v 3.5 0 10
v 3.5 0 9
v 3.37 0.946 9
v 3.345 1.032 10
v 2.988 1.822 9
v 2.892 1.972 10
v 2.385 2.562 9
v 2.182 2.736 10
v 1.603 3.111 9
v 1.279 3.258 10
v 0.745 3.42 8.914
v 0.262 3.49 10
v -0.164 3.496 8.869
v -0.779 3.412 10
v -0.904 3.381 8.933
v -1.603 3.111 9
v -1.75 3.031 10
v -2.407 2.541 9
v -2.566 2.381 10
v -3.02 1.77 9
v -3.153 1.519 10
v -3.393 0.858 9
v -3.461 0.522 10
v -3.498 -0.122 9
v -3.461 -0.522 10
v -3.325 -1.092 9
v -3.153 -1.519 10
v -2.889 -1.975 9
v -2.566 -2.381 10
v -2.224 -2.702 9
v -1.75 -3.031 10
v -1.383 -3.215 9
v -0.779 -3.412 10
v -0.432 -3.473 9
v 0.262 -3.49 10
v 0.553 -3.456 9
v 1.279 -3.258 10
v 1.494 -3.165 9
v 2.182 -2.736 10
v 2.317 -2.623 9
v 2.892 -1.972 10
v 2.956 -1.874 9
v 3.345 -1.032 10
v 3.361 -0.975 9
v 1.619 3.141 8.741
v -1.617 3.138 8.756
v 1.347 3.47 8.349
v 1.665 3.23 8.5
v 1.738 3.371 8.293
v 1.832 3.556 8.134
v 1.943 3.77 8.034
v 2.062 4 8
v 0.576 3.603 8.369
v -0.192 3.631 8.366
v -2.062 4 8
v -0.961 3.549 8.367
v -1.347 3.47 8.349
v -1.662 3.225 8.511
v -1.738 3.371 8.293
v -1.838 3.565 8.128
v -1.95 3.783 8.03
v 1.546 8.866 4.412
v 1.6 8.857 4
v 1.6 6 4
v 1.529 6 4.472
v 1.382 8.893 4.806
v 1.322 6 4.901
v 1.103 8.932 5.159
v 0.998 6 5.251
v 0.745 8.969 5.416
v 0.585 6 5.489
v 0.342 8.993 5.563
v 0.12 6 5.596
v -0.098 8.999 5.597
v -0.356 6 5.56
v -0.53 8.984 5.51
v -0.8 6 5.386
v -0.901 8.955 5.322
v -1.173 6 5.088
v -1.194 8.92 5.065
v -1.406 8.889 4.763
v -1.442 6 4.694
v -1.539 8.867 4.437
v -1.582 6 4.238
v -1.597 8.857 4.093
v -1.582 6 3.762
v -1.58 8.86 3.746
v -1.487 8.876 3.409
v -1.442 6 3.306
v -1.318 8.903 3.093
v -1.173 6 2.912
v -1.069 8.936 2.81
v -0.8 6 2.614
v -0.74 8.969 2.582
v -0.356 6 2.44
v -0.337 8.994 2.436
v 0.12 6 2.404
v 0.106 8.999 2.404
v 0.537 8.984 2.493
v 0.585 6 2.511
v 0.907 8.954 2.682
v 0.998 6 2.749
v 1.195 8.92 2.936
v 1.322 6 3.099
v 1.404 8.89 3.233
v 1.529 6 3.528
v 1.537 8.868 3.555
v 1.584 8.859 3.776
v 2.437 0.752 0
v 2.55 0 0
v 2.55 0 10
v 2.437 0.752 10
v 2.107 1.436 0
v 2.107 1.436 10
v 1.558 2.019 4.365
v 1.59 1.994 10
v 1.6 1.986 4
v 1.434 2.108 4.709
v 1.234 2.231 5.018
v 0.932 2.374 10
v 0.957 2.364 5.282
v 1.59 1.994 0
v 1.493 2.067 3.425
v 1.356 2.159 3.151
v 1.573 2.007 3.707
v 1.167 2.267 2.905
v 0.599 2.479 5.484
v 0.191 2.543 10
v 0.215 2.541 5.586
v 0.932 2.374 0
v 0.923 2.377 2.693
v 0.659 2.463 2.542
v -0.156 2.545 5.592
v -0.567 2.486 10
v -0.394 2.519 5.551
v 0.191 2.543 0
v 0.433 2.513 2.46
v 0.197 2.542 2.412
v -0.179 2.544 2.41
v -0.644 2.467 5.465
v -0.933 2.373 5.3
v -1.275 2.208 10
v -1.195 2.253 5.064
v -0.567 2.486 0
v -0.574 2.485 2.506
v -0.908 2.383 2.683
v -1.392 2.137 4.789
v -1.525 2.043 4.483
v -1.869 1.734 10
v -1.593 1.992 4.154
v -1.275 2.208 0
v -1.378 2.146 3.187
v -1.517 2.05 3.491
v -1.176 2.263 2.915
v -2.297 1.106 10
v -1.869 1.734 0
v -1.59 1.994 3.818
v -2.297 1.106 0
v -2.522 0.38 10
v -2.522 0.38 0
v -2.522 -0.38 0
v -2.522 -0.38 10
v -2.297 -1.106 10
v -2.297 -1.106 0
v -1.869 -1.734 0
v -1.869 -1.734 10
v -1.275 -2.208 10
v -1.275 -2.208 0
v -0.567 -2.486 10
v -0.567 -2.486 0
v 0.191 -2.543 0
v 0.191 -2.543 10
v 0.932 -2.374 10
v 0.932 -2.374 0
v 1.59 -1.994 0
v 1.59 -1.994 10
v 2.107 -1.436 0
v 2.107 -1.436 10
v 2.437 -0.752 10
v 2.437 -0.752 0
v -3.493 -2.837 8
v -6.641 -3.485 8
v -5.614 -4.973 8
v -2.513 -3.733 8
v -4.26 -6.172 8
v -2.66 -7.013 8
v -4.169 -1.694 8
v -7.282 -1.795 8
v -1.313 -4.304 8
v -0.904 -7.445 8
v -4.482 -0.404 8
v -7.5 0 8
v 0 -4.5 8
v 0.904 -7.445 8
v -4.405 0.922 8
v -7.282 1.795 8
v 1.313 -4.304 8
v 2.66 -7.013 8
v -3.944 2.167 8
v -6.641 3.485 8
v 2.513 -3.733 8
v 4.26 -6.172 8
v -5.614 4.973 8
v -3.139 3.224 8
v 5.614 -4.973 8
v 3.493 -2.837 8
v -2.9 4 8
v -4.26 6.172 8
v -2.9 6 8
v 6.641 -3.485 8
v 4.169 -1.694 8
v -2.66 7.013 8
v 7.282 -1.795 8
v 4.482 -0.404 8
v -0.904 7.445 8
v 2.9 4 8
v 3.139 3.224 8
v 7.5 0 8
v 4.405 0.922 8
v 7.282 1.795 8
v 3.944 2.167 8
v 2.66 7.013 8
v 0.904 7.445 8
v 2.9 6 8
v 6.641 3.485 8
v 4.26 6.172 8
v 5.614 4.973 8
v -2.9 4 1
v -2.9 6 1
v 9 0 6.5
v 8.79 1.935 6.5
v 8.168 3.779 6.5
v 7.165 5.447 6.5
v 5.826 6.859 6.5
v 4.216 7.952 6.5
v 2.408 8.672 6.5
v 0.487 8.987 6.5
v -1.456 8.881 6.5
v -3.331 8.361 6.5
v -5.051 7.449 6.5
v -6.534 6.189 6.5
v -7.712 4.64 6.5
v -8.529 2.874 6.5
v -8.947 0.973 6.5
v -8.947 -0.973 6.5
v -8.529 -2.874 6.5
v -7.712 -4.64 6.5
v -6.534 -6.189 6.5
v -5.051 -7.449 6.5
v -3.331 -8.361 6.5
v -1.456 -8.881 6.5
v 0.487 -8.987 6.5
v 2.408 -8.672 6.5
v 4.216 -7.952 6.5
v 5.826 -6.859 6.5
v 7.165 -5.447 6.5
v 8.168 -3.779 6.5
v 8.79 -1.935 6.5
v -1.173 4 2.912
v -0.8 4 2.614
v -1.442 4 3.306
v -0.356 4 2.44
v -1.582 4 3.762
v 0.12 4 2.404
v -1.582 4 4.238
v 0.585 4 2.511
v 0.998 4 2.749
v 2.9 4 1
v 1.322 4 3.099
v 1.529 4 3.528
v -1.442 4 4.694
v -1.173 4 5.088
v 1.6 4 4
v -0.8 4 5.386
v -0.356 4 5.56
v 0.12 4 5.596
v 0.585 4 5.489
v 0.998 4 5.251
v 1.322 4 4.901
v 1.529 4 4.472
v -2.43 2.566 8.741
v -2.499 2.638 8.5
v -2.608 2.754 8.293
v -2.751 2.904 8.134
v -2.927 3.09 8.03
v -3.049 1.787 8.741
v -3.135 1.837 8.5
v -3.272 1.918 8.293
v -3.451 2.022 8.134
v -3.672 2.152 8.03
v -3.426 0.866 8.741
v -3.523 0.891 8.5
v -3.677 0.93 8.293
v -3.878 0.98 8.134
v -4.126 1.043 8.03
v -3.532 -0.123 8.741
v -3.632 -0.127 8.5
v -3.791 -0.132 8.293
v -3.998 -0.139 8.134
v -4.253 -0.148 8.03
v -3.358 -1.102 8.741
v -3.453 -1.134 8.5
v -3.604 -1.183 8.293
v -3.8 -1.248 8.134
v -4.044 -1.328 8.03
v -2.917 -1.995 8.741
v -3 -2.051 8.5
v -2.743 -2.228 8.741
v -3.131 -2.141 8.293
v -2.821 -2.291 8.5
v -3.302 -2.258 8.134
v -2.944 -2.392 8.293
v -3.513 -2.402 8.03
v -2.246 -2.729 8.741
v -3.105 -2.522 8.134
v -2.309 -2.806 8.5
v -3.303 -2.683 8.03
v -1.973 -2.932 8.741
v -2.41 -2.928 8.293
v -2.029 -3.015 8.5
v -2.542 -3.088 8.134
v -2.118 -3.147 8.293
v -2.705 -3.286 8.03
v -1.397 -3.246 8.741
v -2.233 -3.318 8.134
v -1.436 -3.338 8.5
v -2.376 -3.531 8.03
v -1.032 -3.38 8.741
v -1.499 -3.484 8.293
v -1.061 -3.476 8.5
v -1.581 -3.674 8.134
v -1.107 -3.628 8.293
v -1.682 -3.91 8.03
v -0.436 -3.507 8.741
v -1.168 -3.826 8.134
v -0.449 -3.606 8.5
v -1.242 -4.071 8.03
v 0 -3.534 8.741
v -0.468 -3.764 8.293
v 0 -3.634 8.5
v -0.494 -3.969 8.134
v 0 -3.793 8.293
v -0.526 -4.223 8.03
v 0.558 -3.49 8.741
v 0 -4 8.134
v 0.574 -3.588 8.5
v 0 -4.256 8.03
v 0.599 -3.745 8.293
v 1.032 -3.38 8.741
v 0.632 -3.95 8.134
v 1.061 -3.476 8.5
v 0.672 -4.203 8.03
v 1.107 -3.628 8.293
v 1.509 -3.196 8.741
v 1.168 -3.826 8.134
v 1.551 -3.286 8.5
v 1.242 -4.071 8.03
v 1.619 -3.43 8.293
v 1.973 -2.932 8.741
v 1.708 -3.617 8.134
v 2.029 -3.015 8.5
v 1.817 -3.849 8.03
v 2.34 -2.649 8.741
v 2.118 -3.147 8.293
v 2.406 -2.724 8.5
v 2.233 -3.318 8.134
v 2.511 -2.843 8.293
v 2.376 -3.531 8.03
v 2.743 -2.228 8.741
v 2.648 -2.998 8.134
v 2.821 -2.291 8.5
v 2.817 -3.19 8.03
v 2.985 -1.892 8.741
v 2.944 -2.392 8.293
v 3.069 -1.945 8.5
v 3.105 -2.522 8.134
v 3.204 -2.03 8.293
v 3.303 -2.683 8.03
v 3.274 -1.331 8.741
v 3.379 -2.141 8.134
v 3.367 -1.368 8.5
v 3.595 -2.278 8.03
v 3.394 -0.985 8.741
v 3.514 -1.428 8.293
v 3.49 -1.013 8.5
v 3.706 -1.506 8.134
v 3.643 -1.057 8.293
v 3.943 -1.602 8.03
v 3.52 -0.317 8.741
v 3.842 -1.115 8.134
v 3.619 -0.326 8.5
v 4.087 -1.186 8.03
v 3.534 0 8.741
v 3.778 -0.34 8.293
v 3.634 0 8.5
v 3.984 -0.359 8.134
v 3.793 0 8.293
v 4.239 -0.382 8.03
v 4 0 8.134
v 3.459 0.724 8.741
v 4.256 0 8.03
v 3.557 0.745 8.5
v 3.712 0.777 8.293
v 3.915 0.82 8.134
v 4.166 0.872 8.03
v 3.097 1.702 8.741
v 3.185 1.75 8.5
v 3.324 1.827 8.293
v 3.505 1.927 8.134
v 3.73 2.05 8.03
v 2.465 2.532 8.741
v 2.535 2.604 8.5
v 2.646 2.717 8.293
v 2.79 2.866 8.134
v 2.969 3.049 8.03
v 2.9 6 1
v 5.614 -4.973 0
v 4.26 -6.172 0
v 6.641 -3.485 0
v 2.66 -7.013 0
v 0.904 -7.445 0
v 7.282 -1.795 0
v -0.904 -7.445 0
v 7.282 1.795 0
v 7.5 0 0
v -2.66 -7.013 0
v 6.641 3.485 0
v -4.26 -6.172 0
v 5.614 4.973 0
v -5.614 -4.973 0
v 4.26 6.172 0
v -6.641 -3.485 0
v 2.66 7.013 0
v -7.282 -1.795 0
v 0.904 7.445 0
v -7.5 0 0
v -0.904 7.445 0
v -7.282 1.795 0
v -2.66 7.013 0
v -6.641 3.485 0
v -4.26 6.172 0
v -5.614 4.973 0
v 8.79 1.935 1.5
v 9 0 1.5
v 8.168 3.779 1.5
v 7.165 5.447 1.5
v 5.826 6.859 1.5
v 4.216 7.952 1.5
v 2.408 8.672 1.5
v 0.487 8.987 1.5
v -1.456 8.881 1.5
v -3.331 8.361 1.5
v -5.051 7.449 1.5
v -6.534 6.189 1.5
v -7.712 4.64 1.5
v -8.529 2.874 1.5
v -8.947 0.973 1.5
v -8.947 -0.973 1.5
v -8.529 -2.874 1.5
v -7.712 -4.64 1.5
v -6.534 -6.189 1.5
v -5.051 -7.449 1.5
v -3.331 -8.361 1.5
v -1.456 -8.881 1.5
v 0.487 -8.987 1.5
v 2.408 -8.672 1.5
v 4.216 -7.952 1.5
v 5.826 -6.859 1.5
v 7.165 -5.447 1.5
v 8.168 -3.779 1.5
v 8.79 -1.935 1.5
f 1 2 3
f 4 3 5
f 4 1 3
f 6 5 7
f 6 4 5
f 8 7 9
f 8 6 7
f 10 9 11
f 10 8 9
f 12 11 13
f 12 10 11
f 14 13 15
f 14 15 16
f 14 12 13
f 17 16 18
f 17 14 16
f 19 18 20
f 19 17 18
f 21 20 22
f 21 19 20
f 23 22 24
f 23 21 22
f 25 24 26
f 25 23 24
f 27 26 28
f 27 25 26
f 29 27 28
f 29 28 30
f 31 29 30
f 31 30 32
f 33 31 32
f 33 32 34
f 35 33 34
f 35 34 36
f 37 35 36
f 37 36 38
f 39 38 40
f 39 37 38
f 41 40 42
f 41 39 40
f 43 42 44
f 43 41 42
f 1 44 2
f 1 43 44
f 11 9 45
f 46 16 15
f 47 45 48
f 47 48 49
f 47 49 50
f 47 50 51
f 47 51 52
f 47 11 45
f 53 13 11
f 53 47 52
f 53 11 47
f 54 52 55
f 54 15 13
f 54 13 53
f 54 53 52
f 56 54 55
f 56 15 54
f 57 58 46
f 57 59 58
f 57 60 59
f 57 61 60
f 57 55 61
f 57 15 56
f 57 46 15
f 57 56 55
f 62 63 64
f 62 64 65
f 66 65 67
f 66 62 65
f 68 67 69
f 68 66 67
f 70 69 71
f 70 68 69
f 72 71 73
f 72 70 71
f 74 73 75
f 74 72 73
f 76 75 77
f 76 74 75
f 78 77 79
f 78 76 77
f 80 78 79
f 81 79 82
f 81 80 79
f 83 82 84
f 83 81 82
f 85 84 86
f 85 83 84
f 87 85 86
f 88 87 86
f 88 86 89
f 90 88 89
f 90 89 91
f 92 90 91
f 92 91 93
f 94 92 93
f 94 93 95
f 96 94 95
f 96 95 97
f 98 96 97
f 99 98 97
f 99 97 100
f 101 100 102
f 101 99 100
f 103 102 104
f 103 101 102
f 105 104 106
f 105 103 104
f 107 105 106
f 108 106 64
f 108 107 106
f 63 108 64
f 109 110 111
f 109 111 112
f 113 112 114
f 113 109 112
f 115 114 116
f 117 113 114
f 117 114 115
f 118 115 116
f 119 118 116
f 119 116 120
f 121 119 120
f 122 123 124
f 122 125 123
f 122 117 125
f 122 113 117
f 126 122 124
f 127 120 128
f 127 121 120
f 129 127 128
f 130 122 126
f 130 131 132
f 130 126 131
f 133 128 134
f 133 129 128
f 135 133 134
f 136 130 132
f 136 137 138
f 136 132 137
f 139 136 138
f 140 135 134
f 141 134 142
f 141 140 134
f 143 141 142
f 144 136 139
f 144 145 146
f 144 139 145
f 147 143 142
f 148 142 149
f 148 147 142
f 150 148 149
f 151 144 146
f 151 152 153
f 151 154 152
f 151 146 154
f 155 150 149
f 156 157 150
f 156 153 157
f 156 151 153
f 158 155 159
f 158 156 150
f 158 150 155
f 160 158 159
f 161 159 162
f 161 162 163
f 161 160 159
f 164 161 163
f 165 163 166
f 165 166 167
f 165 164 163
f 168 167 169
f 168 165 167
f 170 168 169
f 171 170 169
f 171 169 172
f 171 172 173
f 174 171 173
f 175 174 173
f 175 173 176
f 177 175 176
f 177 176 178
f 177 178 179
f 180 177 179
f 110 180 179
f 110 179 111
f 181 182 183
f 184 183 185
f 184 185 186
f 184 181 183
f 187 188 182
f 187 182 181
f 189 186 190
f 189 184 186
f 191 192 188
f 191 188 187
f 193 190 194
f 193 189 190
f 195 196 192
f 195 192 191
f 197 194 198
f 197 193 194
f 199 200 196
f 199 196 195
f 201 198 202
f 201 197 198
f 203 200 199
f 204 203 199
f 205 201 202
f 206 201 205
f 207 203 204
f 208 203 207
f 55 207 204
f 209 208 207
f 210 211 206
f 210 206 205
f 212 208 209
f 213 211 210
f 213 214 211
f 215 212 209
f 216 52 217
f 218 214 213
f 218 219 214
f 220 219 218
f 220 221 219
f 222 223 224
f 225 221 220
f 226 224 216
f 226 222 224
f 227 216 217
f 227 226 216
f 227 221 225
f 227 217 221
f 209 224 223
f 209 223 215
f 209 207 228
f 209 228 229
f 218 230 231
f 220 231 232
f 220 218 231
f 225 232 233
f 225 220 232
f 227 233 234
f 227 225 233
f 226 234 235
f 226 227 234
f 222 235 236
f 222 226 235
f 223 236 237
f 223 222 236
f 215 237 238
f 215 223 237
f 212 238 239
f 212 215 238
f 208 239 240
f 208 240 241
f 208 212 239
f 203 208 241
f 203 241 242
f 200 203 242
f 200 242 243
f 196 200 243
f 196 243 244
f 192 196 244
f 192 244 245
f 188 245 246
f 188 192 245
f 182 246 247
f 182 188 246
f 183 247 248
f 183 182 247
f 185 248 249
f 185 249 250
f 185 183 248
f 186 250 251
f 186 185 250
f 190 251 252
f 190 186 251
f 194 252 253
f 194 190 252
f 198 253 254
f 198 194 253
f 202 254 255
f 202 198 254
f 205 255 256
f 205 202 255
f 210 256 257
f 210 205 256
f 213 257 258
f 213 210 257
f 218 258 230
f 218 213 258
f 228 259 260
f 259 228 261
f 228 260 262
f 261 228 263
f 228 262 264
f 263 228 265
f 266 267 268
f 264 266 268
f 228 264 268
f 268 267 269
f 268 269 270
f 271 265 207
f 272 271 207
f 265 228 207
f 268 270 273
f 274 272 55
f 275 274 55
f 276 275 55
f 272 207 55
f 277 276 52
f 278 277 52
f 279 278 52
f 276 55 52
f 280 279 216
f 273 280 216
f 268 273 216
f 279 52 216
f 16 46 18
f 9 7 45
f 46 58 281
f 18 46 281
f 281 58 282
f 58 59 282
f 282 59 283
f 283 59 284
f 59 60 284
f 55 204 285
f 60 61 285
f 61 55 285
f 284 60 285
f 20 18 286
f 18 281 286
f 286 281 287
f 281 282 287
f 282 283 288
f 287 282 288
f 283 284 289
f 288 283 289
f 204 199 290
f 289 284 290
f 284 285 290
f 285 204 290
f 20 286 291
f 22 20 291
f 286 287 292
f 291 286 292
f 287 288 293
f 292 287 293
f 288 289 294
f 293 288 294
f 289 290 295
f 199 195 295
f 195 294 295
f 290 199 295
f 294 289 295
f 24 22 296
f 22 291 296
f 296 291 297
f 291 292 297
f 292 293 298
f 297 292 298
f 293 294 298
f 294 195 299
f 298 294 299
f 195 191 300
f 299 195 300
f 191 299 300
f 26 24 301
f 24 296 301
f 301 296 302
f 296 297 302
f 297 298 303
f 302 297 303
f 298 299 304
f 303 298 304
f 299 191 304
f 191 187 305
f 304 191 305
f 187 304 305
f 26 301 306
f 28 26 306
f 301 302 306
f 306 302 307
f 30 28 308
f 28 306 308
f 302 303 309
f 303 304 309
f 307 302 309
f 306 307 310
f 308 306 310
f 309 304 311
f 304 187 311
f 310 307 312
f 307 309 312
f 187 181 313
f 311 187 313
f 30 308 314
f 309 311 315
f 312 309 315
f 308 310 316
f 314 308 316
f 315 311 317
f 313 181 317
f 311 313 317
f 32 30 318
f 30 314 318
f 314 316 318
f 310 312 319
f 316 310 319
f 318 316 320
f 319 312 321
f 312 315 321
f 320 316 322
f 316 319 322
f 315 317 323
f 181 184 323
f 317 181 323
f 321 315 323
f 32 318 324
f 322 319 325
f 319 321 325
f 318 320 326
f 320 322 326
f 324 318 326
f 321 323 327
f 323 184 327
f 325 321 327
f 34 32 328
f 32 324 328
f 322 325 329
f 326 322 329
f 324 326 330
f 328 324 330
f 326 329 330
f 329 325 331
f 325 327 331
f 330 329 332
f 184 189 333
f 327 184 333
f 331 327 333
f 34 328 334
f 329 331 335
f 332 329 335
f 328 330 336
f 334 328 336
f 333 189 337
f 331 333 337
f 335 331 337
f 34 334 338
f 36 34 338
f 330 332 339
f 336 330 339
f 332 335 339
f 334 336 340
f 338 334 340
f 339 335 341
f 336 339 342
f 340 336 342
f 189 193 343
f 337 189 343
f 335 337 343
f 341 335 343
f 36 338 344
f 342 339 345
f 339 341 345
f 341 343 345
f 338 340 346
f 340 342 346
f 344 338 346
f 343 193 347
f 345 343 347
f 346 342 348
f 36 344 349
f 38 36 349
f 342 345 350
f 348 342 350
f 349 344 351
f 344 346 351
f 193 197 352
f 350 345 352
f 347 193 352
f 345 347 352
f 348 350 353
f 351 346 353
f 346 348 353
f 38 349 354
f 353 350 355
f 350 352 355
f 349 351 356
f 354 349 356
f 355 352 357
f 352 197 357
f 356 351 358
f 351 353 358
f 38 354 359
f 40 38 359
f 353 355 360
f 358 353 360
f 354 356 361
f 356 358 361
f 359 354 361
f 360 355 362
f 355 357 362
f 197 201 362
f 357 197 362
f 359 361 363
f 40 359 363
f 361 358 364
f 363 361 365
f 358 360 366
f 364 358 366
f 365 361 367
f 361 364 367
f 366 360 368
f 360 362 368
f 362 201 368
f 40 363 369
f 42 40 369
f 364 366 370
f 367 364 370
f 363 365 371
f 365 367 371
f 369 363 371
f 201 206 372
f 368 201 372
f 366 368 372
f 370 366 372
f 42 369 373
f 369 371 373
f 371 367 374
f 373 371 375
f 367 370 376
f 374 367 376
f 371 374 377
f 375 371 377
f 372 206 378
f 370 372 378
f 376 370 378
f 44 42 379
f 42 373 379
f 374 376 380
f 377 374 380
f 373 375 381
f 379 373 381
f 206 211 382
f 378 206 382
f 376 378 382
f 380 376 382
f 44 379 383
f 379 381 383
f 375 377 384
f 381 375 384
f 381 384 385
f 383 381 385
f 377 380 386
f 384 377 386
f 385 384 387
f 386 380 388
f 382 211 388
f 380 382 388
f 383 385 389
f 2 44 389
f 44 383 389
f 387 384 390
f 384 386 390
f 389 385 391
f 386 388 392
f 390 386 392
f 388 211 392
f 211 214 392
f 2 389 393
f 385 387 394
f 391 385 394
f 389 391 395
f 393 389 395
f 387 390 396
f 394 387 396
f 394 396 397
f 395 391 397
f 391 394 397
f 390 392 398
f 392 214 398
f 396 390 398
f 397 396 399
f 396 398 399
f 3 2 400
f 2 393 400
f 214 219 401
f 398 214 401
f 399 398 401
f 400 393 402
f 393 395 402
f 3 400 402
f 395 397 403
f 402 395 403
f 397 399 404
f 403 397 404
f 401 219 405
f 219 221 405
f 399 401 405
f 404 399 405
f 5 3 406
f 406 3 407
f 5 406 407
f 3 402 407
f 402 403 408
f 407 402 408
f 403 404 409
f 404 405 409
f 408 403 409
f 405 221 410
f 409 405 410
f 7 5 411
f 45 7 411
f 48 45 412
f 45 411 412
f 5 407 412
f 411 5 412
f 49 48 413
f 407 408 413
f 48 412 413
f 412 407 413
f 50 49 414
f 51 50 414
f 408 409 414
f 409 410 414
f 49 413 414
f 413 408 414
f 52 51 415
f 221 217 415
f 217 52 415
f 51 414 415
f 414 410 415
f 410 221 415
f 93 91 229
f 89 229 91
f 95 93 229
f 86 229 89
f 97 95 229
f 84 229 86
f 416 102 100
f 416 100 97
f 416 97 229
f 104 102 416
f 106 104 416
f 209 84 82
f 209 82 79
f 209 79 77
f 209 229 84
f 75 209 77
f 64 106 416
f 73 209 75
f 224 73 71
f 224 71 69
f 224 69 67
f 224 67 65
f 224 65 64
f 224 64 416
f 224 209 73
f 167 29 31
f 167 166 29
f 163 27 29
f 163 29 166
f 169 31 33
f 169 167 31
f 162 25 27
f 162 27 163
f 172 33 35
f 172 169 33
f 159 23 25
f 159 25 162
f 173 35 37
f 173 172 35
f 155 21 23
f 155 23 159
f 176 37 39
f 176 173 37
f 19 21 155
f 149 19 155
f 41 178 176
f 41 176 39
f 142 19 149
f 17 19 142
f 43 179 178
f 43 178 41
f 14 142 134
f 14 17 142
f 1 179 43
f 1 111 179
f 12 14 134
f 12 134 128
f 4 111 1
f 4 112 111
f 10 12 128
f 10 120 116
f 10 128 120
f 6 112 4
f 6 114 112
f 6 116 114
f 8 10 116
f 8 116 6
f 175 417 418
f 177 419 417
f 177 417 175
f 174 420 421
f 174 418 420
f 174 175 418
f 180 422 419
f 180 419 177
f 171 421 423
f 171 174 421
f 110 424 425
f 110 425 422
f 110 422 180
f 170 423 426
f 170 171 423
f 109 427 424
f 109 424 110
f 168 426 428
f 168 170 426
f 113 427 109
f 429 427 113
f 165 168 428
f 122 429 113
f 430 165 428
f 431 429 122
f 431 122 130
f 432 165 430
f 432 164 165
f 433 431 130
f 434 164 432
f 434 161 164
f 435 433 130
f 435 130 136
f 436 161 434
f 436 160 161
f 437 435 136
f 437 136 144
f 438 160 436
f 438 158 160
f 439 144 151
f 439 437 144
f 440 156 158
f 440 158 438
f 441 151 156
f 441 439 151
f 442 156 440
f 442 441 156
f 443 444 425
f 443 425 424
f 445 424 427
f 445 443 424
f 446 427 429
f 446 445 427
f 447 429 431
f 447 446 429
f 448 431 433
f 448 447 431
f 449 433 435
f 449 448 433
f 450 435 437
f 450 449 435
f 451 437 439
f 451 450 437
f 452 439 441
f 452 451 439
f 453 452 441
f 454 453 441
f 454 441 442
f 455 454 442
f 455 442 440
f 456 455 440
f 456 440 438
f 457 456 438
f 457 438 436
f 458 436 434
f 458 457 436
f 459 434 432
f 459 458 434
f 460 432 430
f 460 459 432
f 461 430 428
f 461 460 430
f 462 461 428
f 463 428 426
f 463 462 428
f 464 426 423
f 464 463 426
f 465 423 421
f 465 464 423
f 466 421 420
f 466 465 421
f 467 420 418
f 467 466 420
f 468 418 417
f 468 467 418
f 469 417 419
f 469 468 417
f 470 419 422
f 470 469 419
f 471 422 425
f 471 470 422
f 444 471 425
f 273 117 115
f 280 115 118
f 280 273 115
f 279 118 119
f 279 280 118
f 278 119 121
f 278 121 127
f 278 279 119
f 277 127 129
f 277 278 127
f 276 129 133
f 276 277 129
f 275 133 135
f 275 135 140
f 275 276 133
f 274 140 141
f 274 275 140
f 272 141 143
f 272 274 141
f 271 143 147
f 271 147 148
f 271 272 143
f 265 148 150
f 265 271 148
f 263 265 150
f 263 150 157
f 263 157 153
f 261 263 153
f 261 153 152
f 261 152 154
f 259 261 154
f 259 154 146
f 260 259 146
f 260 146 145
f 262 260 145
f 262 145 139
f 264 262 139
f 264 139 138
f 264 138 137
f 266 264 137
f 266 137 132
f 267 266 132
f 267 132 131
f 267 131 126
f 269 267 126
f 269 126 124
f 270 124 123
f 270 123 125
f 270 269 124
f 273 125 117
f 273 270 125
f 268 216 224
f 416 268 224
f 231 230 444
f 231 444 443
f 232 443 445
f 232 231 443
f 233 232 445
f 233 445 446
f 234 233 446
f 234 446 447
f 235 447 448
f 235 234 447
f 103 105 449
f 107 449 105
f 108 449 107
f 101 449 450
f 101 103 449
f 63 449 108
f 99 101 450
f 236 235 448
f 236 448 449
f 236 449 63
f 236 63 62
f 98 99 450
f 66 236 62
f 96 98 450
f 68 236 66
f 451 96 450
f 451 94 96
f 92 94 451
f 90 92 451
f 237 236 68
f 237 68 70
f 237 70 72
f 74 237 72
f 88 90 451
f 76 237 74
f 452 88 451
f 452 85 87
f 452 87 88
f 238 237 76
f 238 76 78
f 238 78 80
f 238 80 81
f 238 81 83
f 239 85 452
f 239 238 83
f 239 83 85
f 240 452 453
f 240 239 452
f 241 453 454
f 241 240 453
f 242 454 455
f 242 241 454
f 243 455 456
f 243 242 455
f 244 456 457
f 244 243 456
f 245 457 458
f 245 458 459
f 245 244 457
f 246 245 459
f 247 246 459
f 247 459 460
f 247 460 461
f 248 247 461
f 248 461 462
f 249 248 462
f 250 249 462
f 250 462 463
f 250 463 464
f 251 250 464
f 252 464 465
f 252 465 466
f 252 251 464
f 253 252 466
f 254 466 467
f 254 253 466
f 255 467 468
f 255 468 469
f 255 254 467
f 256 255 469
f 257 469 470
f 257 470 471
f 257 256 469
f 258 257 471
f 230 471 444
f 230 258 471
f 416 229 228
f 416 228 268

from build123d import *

# Parameters (mm, degrees)
F2_W     = 5.8
F2_H     = 2
F3_DEPTH = 7
F5_R     = 1.6
F6_REACH = 23.5264833996
F7_SIZE  = 1.5
F8_R     = 1


with BuildPart() as f1:
    # F0 (on Front) → F1 (revolve)
    with BuildSketch(Plane.XZ):
        Polygon((2.55, 10), (2.55, 0), (9, 0), (9, 8), (3.5, 8), (3.5, 10), align=None)
    revolve(axis=Axis((0, 0, 10), (0, 0, 1)))

    # F2 (on face) → F3 (cut)
    with BuildSketch(Plane.XY.offset(8)):
        with Locations((0, 5)):
            Rectangle(F2_W, F2_H)
    extrude(amount=-F3_DEPTH, mode=Mode.SUBTRACT)

    f6_end = f1.faces().sort_by_distance((-2.55, 0, 5))[0]
    # F5 (on offset) → F6 (cut, up to a face of the model that its end follows)
    with BuildSketch(Plane.XZ.offset(-10)):
        with Locations((0, 4)):
            Circle(F5_R)
    f6_long = extrude(amount=F6_REACH, mode=Mode.PRIVATE)
    add(split(f6_long, bisect_by=f6_end, keep=Keep.ALL, mode=Mode.PRIVATE).solids().sort_by_distance((0, 10, 4))[0], mode=Mode.SUBTRACT)

    # F7
    f7_edges = [f1.edges().sort_by_distance(p)[0] for p in [
        (-9, 0, 8),
        (-9, 0, 0),
    ]]
    chamfer(f7_edges, length=F7_SIZE)

    # F8
    f8_edges = [f1.edges().sort_by_distance(p)[0] for p in [
        (-3.5, 0, 8),
    ]]
    fillet(f8_edges, radius=F8_R)


solid = f1.part
